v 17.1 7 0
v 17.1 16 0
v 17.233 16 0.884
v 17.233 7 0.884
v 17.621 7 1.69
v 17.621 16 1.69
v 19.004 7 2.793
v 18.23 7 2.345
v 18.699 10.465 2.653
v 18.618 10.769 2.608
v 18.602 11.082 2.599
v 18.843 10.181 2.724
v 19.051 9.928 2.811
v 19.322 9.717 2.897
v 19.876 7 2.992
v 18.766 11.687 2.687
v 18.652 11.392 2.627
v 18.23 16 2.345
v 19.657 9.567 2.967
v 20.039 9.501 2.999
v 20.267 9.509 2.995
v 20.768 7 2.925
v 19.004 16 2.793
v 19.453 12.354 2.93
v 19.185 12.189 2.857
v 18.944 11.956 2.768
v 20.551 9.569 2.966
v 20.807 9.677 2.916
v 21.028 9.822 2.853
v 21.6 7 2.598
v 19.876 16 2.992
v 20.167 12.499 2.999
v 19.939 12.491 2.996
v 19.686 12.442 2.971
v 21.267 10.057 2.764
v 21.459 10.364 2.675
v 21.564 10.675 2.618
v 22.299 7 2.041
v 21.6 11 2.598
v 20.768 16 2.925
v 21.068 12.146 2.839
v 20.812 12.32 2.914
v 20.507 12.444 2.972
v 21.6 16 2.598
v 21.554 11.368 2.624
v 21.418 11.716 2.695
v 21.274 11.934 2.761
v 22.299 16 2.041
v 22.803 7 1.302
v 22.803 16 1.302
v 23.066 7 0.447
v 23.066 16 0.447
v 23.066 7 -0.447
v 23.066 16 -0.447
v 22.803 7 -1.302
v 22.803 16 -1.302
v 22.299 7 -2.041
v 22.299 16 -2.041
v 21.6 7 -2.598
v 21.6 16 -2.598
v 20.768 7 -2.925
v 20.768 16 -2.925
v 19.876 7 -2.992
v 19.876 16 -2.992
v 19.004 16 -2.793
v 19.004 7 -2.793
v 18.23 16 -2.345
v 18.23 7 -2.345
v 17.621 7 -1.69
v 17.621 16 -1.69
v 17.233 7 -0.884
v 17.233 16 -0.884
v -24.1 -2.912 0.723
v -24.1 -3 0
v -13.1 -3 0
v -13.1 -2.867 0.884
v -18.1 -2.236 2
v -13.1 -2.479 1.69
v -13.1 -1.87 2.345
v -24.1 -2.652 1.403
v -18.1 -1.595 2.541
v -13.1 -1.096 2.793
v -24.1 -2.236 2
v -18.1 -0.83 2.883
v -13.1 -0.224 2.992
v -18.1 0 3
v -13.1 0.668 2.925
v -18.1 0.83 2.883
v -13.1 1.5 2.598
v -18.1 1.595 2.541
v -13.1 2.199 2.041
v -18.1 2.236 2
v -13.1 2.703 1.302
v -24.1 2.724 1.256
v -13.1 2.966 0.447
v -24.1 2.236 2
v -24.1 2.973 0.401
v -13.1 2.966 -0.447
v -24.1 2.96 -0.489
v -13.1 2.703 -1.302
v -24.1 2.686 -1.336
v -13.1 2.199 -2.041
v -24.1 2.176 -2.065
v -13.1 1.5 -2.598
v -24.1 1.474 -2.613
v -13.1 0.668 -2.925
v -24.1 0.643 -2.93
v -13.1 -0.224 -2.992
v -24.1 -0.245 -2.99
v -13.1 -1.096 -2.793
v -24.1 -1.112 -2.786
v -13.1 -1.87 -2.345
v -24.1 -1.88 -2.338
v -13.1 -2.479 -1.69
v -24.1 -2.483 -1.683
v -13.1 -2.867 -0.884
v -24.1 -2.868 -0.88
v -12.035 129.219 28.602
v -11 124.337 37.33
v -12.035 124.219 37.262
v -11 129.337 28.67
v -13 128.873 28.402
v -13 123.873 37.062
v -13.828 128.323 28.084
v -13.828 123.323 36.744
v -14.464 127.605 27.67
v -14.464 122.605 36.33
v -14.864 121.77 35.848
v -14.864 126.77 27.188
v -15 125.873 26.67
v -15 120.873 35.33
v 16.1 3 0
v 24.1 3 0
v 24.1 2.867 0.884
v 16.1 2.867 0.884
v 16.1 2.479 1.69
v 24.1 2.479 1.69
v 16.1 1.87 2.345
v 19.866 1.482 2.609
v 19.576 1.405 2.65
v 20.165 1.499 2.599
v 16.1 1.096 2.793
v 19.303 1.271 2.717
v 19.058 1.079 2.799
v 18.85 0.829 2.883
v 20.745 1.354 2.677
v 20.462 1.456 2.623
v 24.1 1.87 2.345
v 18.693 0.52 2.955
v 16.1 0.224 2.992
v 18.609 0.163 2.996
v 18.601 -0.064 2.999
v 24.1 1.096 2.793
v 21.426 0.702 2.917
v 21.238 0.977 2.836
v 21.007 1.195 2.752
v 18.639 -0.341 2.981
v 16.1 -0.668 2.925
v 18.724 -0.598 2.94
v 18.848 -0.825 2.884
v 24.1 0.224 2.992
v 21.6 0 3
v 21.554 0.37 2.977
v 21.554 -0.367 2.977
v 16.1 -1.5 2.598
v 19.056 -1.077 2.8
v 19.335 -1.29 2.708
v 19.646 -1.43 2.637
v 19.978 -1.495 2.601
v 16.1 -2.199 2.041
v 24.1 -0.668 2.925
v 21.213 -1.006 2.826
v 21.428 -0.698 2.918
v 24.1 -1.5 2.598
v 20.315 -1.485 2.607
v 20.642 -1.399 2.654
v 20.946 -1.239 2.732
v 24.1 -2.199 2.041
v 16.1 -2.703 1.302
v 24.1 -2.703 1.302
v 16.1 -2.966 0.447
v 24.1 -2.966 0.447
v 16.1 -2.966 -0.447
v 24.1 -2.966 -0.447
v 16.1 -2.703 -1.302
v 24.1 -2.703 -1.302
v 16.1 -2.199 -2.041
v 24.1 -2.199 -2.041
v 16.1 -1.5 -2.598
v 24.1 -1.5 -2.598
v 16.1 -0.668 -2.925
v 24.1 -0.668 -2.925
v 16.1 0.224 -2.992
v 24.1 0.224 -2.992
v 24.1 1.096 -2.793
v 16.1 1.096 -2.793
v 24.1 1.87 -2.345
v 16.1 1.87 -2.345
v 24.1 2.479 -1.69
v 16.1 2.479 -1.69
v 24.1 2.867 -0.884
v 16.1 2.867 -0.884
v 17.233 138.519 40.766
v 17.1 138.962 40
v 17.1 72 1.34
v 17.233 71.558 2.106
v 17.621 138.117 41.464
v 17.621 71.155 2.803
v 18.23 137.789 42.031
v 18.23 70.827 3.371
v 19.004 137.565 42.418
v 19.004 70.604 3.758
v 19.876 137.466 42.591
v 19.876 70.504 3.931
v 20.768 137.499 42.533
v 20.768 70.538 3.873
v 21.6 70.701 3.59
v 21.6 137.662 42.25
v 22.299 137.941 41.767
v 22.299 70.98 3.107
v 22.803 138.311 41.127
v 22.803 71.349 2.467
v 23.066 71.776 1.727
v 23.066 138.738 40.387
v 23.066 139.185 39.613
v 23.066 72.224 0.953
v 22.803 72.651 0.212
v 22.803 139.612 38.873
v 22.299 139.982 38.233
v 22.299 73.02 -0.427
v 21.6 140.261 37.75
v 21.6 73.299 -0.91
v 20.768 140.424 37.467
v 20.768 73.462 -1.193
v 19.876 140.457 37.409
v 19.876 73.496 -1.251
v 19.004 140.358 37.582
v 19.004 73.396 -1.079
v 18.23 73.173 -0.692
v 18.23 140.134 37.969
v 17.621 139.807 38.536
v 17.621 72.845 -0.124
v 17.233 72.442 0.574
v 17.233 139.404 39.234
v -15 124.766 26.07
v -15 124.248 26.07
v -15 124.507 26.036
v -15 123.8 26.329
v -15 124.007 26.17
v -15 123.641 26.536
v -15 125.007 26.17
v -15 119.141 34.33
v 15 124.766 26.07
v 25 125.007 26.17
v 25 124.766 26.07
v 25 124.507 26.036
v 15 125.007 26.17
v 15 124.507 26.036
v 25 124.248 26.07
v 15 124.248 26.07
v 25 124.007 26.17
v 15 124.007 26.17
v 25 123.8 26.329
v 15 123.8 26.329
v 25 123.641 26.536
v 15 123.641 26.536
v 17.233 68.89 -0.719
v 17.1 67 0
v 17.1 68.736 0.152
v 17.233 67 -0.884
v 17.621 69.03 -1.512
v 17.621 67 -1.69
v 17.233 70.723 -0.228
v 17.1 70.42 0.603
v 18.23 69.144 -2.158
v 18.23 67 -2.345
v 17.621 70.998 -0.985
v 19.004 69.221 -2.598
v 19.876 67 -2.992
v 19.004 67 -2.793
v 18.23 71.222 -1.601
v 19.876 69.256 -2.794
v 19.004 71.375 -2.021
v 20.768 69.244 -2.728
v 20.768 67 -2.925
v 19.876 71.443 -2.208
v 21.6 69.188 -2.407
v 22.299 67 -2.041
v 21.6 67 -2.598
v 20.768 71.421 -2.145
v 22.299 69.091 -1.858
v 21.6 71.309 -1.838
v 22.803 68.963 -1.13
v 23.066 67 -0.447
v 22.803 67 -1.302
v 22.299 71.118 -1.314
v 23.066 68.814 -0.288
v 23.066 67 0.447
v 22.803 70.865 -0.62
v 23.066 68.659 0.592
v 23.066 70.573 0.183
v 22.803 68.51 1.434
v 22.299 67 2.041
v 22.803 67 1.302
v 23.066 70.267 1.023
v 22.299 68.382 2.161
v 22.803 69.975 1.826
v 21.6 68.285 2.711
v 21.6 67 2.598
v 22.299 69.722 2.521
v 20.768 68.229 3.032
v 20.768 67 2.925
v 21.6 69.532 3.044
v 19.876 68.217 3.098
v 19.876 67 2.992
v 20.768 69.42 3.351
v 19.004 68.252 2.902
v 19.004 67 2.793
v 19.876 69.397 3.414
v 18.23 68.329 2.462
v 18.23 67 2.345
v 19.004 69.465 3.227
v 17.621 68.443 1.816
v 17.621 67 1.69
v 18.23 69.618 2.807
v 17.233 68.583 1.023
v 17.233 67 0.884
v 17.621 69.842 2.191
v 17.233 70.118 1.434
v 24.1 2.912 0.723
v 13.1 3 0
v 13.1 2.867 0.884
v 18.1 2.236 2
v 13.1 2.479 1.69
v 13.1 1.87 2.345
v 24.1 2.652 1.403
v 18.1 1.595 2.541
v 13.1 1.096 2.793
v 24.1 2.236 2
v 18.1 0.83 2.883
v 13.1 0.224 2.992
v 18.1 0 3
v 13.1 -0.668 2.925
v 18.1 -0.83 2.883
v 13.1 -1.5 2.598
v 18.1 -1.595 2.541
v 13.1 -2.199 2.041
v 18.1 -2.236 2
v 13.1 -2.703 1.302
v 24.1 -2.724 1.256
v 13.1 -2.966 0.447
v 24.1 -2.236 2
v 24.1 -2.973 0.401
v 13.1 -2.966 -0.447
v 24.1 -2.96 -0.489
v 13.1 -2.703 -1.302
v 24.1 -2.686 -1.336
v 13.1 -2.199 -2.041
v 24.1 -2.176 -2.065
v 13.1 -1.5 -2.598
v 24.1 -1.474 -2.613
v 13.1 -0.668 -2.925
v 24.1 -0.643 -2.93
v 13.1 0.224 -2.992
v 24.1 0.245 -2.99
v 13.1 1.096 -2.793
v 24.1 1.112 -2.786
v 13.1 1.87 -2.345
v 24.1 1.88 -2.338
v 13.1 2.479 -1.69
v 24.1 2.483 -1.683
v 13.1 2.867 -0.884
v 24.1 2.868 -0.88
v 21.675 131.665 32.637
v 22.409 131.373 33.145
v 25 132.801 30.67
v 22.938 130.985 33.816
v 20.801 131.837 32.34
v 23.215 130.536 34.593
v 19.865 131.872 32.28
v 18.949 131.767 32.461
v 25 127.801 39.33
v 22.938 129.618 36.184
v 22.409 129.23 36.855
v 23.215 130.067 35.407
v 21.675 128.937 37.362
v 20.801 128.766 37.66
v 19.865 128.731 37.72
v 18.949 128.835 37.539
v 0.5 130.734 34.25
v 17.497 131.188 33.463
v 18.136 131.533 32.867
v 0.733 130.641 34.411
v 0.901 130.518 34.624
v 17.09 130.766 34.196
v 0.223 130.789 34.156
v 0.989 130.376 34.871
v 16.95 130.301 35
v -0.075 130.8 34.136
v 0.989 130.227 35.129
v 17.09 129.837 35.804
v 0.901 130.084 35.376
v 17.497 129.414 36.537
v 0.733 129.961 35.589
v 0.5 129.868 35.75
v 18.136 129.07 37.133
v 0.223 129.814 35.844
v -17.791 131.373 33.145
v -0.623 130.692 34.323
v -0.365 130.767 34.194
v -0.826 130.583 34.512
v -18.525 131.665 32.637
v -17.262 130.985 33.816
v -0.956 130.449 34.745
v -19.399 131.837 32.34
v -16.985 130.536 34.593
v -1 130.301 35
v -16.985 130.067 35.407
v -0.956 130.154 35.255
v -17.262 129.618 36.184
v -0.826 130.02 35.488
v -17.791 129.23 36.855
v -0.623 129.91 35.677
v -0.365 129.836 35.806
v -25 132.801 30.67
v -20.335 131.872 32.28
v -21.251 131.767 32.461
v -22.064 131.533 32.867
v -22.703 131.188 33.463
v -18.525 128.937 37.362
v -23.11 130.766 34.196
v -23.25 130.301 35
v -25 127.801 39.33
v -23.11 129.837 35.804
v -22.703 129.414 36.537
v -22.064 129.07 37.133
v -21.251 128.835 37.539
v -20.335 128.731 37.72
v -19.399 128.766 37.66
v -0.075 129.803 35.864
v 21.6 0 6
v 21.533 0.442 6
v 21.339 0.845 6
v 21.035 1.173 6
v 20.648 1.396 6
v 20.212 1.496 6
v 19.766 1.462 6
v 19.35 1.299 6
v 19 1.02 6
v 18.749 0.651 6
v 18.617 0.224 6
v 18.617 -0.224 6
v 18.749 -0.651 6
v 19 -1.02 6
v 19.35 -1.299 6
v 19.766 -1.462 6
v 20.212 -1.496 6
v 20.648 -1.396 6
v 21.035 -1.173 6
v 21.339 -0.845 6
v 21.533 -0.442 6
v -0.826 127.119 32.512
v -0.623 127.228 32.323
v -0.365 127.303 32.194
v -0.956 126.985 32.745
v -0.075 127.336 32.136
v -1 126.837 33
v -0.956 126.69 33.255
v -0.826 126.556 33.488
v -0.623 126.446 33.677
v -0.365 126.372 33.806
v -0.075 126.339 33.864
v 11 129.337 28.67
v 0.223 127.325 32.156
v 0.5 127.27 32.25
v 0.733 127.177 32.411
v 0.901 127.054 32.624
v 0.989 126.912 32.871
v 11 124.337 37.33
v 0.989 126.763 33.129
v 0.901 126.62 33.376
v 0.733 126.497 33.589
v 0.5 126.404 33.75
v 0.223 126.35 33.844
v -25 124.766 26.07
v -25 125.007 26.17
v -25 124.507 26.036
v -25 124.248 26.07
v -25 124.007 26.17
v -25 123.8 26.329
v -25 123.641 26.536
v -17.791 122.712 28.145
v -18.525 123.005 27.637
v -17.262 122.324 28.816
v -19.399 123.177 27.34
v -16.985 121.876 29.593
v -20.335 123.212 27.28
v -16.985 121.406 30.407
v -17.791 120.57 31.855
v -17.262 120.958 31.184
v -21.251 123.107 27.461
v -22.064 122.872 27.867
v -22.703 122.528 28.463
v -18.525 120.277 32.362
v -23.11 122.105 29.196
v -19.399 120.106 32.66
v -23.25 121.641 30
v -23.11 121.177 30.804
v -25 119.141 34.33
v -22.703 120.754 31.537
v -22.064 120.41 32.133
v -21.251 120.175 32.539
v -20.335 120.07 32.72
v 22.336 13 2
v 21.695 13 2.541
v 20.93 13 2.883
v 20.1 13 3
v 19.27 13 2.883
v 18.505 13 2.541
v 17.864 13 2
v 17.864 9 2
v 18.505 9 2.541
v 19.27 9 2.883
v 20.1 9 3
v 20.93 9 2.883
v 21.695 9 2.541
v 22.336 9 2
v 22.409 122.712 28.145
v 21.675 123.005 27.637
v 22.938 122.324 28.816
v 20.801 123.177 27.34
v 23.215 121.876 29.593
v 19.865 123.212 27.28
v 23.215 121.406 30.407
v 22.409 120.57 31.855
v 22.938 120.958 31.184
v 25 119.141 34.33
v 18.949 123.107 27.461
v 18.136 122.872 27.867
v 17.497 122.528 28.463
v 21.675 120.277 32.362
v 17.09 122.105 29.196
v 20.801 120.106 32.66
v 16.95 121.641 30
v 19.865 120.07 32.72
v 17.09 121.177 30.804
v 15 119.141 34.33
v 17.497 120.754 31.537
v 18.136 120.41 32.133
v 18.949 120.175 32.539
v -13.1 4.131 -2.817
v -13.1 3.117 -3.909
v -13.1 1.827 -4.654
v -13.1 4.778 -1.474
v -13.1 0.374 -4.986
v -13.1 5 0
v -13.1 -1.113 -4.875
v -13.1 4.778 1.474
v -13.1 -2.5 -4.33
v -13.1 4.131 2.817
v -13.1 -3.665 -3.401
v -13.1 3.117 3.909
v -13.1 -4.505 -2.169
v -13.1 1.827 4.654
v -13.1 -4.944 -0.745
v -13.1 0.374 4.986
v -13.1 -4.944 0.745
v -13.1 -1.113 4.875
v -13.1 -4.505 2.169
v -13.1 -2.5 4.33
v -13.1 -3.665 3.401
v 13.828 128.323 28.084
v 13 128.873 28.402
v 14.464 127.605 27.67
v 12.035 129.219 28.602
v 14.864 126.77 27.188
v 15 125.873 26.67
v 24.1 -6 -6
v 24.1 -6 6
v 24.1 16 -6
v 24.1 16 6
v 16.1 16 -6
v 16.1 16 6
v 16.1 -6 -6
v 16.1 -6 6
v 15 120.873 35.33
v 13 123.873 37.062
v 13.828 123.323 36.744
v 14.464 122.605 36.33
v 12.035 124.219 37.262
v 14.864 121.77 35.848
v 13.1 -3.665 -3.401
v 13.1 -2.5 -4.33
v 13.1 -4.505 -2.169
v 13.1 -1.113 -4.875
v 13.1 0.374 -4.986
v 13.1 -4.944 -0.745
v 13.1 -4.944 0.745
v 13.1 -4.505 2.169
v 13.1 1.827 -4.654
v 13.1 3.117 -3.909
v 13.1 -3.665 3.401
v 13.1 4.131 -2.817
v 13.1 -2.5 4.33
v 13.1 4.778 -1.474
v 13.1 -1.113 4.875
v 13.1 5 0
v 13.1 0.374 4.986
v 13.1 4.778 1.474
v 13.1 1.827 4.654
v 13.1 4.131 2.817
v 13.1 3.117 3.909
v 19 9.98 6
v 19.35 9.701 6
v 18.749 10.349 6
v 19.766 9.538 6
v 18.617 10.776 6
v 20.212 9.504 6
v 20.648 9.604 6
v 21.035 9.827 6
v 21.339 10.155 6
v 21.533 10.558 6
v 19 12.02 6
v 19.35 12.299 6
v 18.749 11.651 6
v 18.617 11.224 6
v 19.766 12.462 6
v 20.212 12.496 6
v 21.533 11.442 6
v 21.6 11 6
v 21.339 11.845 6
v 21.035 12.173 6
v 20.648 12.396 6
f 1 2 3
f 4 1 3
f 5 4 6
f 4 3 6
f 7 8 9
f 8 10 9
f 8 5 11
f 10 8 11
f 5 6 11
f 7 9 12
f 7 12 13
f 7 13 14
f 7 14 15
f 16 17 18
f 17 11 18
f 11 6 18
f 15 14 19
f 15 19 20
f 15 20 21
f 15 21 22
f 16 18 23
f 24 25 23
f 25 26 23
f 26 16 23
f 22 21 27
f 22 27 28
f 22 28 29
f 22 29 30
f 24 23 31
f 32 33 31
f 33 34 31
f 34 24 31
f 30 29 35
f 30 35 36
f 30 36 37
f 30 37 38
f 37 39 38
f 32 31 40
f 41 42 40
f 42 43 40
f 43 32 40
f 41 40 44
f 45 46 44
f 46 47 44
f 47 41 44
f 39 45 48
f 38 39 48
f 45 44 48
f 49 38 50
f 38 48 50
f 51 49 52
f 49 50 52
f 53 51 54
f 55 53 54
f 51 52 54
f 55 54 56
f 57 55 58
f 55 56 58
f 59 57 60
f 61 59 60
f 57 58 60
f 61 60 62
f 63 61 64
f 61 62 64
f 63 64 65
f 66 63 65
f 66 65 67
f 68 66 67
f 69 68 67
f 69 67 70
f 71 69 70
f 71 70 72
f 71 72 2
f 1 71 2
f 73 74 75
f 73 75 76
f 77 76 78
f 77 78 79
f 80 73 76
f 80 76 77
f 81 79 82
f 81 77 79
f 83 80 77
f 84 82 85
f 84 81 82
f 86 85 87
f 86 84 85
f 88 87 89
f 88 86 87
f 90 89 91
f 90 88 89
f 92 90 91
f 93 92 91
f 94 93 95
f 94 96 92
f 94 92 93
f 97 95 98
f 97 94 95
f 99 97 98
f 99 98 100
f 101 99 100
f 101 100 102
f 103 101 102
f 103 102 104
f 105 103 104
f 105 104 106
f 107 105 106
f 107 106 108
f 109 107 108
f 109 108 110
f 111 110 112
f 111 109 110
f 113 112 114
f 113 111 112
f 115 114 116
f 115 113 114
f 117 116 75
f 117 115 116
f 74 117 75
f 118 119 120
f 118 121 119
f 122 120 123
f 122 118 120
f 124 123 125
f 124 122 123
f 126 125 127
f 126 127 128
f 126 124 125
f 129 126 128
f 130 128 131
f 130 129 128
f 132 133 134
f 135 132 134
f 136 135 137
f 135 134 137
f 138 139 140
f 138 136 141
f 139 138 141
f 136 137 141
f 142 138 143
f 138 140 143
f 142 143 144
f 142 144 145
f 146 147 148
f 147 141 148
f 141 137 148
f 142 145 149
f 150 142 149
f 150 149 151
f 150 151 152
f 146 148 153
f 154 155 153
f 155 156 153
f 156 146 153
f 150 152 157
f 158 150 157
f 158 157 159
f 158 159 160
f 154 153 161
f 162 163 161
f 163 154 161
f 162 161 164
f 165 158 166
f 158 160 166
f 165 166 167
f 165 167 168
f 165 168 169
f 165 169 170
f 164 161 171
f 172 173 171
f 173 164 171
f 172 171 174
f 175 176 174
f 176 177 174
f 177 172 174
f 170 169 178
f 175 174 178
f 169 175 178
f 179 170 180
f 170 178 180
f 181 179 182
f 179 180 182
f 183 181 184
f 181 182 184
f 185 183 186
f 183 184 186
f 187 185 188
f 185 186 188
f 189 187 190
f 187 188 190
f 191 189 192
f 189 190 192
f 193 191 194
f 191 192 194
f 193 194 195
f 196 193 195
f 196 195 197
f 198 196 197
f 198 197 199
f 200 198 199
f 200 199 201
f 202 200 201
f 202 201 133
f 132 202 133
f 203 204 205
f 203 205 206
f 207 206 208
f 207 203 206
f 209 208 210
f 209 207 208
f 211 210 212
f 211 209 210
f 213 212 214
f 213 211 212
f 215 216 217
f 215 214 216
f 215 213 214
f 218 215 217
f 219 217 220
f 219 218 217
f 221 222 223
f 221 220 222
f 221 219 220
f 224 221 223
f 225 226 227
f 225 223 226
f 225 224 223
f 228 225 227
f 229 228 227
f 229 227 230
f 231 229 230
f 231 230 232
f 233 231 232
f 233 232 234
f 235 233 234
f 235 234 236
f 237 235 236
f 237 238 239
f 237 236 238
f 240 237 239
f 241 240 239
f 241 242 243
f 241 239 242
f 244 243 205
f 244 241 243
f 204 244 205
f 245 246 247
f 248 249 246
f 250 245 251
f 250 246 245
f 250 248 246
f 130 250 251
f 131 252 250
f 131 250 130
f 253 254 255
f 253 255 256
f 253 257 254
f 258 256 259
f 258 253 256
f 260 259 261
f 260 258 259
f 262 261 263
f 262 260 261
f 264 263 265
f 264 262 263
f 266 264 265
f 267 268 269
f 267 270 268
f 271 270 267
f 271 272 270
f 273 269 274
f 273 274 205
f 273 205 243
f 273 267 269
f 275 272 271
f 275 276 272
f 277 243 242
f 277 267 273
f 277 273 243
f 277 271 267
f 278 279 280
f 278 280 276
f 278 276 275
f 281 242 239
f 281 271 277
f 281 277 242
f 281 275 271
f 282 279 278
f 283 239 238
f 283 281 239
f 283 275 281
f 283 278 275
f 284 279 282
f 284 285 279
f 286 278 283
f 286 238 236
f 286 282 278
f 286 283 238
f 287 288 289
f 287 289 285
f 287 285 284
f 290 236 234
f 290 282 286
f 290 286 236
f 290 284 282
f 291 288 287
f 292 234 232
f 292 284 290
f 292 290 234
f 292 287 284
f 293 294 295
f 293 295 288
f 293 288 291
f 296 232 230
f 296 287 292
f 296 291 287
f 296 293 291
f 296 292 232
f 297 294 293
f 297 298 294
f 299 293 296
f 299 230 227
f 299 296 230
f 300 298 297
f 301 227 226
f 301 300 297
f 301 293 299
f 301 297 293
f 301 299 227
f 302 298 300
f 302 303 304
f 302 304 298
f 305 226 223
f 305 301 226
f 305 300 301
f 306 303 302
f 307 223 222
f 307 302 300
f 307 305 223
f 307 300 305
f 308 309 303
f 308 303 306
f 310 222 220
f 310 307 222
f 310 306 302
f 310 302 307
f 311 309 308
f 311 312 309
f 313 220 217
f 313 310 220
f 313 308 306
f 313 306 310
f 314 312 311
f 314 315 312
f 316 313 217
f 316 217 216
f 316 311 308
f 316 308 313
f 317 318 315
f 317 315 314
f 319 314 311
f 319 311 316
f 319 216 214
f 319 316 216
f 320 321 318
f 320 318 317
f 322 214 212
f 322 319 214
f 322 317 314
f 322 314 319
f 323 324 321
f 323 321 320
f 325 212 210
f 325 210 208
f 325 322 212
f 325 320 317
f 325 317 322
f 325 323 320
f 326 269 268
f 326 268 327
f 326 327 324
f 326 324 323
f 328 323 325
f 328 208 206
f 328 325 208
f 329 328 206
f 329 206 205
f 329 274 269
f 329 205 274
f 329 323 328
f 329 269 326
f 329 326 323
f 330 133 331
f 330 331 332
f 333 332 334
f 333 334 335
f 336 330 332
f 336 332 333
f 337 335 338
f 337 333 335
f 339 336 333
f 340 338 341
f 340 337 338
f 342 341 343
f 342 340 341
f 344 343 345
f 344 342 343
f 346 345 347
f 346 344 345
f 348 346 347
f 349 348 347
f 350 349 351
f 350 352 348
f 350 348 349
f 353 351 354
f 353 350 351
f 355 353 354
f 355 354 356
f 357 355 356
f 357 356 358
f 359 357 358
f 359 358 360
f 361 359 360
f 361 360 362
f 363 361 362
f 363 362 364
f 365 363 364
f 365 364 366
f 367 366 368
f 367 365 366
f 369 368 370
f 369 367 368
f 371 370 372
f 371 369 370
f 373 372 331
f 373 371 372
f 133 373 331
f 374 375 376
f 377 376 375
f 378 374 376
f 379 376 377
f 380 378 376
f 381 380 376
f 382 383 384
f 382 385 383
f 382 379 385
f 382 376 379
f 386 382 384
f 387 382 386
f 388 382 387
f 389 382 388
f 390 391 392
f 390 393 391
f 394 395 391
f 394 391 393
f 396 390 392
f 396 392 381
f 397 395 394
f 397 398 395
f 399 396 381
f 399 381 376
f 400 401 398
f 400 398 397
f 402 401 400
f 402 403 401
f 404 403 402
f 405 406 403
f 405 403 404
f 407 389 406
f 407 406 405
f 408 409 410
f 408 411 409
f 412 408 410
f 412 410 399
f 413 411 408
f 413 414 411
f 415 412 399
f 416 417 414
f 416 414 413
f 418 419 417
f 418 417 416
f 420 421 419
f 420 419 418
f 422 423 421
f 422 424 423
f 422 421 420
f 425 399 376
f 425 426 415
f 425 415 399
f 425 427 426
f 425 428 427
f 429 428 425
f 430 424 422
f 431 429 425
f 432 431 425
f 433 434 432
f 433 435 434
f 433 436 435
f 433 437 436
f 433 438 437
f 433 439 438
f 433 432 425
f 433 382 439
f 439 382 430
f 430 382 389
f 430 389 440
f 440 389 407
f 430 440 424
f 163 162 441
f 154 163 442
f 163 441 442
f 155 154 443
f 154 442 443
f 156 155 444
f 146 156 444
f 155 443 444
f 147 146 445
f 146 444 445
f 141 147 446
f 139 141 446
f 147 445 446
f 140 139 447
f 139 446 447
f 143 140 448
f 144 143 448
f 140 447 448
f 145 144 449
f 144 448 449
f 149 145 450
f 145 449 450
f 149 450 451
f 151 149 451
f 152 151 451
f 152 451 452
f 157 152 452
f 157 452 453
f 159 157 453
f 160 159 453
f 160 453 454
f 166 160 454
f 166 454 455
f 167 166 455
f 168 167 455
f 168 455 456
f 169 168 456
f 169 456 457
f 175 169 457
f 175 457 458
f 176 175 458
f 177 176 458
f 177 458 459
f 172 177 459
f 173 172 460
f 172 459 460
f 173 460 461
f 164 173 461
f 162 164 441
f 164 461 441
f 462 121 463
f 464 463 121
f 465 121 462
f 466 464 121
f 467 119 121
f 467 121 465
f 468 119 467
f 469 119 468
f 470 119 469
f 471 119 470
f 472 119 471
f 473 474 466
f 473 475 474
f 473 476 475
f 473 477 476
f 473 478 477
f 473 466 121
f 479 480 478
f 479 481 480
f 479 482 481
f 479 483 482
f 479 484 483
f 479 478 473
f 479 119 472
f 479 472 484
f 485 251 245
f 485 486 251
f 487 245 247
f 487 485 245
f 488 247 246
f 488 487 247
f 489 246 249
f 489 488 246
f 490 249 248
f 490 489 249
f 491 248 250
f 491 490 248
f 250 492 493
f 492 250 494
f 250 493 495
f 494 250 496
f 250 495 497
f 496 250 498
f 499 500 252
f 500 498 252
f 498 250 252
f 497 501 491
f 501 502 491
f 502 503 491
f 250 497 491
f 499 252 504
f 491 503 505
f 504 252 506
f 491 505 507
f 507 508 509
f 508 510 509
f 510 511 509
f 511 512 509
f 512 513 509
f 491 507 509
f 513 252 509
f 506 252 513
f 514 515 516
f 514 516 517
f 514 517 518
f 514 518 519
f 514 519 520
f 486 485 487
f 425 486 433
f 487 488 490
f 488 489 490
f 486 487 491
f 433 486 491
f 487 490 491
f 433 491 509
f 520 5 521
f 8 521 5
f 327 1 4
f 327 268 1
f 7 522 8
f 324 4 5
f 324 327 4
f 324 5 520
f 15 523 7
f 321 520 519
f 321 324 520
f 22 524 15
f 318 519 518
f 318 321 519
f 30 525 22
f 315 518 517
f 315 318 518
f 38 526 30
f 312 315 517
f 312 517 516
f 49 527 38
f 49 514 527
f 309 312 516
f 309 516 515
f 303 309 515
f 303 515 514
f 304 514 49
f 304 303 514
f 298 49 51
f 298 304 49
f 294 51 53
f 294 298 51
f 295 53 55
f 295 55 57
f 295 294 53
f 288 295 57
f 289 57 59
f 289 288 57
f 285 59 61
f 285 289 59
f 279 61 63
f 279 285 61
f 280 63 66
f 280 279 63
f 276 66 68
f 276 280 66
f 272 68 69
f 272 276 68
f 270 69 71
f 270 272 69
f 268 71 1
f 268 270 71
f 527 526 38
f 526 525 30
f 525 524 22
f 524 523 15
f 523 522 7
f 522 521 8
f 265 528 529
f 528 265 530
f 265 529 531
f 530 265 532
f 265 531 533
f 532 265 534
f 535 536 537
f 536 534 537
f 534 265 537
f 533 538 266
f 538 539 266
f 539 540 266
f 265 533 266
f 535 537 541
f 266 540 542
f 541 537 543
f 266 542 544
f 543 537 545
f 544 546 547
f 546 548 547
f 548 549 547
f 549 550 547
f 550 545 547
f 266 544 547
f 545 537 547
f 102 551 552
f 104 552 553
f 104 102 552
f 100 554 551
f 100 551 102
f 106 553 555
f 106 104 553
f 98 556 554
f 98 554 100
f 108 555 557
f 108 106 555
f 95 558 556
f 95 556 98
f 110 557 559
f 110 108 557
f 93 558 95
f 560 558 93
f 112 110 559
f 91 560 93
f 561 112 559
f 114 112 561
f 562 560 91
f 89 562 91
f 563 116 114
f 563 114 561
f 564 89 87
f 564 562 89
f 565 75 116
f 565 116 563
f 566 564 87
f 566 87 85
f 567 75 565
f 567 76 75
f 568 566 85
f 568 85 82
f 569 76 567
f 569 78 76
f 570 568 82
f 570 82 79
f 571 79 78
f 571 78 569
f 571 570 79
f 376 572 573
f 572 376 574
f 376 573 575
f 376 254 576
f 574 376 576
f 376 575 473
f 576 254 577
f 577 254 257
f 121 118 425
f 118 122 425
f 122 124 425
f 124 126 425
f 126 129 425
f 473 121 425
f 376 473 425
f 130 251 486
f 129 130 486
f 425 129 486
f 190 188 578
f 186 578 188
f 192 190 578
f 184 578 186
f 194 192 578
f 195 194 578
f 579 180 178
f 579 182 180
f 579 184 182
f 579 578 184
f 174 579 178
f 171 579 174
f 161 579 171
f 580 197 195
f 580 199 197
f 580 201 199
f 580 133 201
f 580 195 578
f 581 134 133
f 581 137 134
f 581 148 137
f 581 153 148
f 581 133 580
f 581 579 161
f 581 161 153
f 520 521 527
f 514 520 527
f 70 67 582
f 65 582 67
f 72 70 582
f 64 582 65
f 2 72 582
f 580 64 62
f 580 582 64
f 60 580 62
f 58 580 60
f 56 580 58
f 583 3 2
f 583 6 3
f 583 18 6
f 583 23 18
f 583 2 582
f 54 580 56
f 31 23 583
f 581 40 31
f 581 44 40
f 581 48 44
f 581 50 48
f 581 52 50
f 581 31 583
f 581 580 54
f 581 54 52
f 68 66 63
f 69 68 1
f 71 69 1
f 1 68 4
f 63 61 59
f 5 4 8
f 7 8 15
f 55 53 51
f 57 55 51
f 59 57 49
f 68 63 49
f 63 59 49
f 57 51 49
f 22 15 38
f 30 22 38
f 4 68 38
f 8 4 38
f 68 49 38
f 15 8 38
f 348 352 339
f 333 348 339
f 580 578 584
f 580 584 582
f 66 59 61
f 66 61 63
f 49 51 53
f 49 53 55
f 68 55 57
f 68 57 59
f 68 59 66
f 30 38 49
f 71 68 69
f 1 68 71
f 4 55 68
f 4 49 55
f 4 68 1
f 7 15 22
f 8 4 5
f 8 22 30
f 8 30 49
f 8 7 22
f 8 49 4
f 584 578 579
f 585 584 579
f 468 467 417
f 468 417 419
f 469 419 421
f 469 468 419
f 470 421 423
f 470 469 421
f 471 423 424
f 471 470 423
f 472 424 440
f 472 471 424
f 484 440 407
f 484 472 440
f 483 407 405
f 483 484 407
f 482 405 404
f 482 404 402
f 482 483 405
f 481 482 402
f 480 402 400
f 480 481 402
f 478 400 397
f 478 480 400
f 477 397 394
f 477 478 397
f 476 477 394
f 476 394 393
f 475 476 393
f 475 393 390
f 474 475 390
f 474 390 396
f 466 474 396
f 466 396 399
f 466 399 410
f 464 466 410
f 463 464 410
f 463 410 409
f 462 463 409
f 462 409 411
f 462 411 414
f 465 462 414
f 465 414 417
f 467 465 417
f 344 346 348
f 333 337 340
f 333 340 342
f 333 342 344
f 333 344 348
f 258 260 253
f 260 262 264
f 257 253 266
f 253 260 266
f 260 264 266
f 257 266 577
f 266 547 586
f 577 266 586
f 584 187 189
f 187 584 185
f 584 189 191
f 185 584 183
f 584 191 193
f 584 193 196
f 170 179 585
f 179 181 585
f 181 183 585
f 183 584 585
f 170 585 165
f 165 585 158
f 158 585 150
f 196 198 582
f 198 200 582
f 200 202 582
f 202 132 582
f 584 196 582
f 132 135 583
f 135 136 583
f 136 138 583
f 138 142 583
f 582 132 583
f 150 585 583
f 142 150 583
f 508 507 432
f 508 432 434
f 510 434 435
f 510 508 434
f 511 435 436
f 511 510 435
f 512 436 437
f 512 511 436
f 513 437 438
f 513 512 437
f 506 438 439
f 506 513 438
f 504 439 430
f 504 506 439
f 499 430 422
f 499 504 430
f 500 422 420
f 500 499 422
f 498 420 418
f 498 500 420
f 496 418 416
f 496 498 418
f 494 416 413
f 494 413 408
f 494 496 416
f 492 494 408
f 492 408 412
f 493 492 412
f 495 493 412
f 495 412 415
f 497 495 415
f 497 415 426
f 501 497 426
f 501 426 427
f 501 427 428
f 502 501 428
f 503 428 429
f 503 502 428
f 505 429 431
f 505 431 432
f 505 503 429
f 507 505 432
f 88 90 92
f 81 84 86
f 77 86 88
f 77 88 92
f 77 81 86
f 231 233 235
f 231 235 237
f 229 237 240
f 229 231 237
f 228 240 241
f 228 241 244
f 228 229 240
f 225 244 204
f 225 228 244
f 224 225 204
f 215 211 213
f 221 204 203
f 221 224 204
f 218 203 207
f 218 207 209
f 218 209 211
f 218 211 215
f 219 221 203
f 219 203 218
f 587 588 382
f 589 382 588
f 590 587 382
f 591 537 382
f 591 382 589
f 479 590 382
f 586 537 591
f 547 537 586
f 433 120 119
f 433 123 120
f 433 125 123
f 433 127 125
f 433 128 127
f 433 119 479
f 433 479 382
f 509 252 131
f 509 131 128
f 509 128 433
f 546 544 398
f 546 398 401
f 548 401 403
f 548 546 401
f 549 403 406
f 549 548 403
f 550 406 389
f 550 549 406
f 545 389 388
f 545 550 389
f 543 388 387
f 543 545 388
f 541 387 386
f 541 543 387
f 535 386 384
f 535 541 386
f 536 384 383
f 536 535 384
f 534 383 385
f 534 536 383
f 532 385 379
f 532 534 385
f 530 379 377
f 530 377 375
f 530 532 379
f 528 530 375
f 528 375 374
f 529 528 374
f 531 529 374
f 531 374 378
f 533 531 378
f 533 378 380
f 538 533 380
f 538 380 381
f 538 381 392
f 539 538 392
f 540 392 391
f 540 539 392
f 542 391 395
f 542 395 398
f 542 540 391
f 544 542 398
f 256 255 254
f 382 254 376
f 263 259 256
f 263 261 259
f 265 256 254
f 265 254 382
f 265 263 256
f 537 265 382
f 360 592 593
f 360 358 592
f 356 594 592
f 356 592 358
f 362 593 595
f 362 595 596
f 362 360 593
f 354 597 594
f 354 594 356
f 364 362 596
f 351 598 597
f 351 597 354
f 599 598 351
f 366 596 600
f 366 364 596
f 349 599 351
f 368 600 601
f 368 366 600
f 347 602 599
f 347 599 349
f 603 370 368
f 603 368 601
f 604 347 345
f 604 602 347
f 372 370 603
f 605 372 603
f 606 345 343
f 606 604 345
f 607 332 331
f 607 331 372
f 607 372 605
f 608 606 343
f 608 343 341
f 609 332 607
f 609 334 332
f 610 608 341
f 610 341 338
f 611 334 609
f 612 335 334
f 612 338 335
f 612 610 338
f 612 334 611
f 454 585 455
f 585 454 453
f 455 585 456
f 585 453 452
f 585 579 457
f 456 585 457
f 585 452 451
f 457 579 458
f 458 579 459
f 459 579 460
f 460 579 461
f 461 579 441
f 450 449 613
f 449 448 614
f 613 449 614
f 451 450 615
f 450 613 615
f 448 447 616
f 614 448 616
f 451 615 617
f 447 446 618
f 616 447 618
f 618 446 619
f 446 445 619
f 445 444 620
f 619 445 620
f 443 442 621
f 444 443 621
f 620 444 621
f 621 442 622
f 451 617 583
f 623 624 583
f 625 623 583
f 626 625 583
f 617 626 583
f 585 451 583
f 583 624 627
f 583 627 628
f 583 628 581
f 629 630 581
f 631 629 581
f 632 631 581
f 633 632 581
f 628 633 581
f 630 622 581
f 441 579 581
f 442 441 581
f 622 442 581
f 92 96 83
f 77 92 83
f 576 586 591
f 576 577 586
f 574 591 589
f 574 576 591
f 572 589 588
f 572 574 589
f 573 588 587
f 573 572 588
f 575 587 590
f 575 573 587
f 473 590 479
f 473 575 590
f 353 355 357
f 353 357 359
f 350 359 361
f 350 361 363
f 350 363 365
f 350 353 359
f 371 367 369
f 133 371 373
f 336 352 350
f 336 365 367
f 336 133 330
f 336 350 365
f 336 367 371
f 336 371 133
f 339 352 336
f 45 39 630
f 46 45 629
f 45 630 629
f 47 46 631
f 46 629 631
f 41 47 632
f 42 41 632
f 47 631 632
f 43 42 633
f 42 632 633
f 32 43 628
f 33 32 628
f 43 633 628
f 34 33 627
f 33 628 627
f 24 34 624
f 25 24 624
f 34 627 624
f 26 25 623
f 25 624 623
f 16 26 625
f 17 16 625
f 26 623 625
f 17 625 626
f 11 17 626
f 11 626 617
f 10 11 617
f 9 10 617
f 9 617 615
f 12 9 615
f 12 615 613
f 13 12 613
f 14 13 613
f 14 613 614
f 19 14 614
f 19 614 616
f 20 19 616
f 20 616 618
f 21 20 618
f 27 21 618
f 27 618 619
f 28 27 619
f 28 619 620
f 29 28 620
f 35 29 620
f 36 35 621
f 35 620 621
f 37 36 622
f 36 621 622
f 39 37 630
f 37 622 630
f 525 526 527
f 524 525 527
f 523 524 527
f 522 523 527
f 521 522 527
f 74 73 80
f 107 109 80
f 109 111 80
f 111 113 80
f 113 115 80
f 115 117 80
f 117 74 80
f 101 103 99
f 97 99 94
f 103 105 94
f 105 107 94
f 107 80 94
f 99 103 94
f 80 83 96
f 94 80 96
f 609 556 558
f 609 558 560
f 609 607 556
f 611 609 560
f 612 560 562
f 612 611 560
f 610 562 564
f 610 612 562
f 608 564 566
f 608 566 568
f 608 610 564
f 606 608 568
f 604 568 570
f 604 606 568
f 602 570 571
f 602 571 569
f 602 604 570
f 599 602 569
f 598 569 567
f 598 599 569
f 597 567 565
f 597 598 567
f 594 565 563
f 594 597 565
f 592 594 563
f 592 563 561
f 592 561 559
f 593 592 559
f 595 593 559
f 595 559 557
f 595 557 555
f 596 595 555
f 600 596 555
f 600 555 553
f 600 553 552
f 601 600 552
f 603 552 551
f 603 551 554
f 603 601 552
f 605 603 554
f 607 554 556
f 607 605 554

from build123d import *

# Parameters (mm, degrees)
F0_R      = 5
F1_DEPTH  = 24.1
F2_R      = 5
F2_R_2    = 3
F3_DEPTH  = 11
F4_R      = 5
F4_R_2    = 3
F5_DEPTH  = 11
F7_DEPTH  = 6
F9_DEPTH  = 6
F10_W     = 22
F10_H     = 12
F11_DEPTH = 8
F12_R     = 3
F13_DEPTH = 48.201
F14_R     = 3
F15_DEPTH = 9
F16_R     = 1.5
F17_REACH = 16.2436406871
F18_R     = 1.5
F19_REACH = 16.2436406871
F20_R     = 3
F25_DEPTH = 4
F27_W     = 50
F27_H     = 10
F27_R     = 3.15
F27_R_2   = 1
F28_DEPTH = 10
F29_W     = 30
F29_H     = 6
F30_DEPTH = 45.5881685741
F31_R     = 4
F32_R     = 1


with BuildPart() as f1:
    # F0 (on Right) → F1 (new body, symmetric)
    with BuildSketch(Plane.YZ):
        Circle(F0_R)
    extrude(amount=F1_DEPTH, both=True)

    # F2 (on face) → F3 (cut)
    with BuildSketch(Plane.YZ.offset(24.1)):
        Circle(F2_R)
        Circle(F2_R_2, mode=Mode.SUBTRACT)
    extrude(amount=-F3_DEPTH, mode=Mode.SUBTRACT)

    # F4 (on face) → F5 (cut)
    with BuildSketch(Plane(origin=(-24.1, 0, 0), x_dir=(0, -1, 0), z_dir=(-1, 0, 0))):
        Circle(F4_R)
        Circle(F4_R_2, mode=Mode.SUBTRACT)
    extrude(amount=-F5_DEPTH, mode=Mode.SUBTRACT)

    # F6 (on face) → F7 (cut)
    with BuildSketch(Plane.YZ.offset(24.1)):
        with BuildLine():
            ThreePointArc((2.2360679775, 2), (0, 3), (-2.2360679775, 2))
            Line((-2.2360679775, 2), (2.2360679775, 2))
        make_face()
    extrude(amount=-F7_DEPTH, mode=Mode.SUBTRACT)

    # F8 (on face) → F9 (cut)
    with BuildSketch(Plane(origin=(-24.1, 0, 0), x_dir=(0, -1, 0), z_dir=(-1, 0, 0))):
        with BuildLine():
            Line((-2.2360679775, 2), (2.2360679775, 2))
            ThreePointArc((2.2360679775, 2), (0, 3), (-2.2360679775, 2))
        make_face()
    extrude(amount=-F9_DEPTH, mode=Mode.SUBTRACT)


with BuildPart() as f11:
    # F10 (on face) → F11 (new body)
    with BuildSketch(Plane.YZ.offset(24.1)):
        with Locations((5, 0)):
            Rectangle(F10_W, F10_H)
    extrude(amount=-F11_DEPTH)

    # F12 (on face) → F13 (cut, through all)
    with BuildSketch(Plane.YZ.offset(24.1)):
        Circle(F12_R)
    extrude(amount=-F13_DEPTH, mode=Mode.SUBTRACT)

    # F14 (on face) → F15 (cut)
    with BuildSketch(Plane(origin=(0, 16, 0), x_dir=(-1, 0, 0), z_dir=(0, 1, 0))):
        with Locations((-20.1, 0)):
            Circle(F14_R)
    extrude(amount=-F15_DEPTH, mode=Mode.SUBTRACT)

    f17_end = f11.faces().sort_by_distance((20.1, -3, 0))[0]
    # F16 (on face) → F17 (cut, up to a face of the model that its end follows)
    with BuildSketch(Plane.XY.offset(6)):
        with Locations((20.1, 0)):
            Circle(F16_R)
    f17_long = extrude(amount=-F17_REACH, mode=Mode.PRIVATE)
    add(split(f17_long, bisect_by=f17_end, keep=Keep.ALL, mode=Mode.PRIVATE).solids().sort_by_distance((20.1, 0, 6))[0], mode=Mode.SUBTRACT)

    f19_end = f11.faces().sort_by_distance((23.1, 11.5, 0))[0]
    # F18 (on face) → F19 (cut, up to a face of the model that its end follows)
    with BuildSketch(Plane.XY.offset(6)):
        with Locations((20.1, 11)):
            Circle(F18_R)
    f19_long = extrude(amount=-F19_REACH, mode=Mode.PRIVATE)
    add(split(f19_long, bisect_by=f19_end, keep=Keep.ALL, mode=Mode.PRIVATE).solids().sort_by_distance((20.1, 11, 6))[0], mode=Mode.SUBTRACT)


with BuildPart() as f22:
    # F22: sweep along a path in F21
    with BuildLine(Plane.YZ) as f22_path:
        Line((7, 0), (67, 0))
        ThreePointArc((67, 0), (69.588190451, 0.3407417371), (72, 1.3397459622))
        Line((72, 1.3397459622), (138.9615242271, 40))
    # F20 (on face) → F22 (sweep)
    with BuildSketch(Plane(origin=(0, 7, 0), x_dir=(-1, 0, 0), z_dir=(0, 1, 0))):
        with Locations((-20.1, 0)):
            Circle(F20_R)
    sweep(path=f22_path.line)

    # F24 (on offset) → F25 (cut)
    with BuildSketch(Plane.XZ.offset(-9)):
        with BuildLine():
            Line((17.8639320225, 2), (22.3360679775, 2))
            ThreePointArc((22.3360679775, 2), (20.1, 3), (17.8639320225, 2))
        make_face()
    extrude(amount=-F25_DEPTH, mode=Mode.SUBTRACT)


with BuildPart() as f28:
    # F27 (on offset) → F28 (new body)
    with BuildSketch(Plane(origin=(0, 104.2211431703, 60.1721050646), x_dir=(-1, 0, 0), z_dir=(0, 0.8660254038, 0.5))):
        with Locations((0, -34.8397459622)):
            Rectangle(F27_W, F27_H)
        with Locations((-20.1, -34.8397459622)):
            Circle(F27_R, mode=Mode.SUBTRACT)
        with Locations((0, -34.8397459622)):
            Circle(F27_R_2, mode=Mode.SUBTRACT)
        with Locations((20.1, -34.8397459622)):
            Circle(F27_R, mode=Mode.SUBTRACT)
    extrude(amount=F28_DEPTH)

    # F29 (on face) → F30 (cut, through all)
    with BuildSketch(Plane(origin=(0, 14.9198729811, -25.8419780457), x_dir=(1, 0, 0), z_dir=(0, -0.5, 0.8660254038))):
        with Locations((0, 123.3442101292)):
            Rectangle(F29_W, F29_H)
    extrude(amount=-F30_DEPTH, mode=Mode.SUBTRACT)

    # F31
    f31_edges = [f28.edges().sort_by_distance(p)[0] for p in [
        (-15, 126.837169, 33),
        (15, 126.837169, 33),
    ]]
    fillet(f31_edges, radius=F31_R)

    # F32
    f32_edges = [f28.edges().sort_by_distance(p)[0] for p in [
        (20, 124.141016, 25.669873),
        (-20, 124.141016, 25.669873),
    ]]
    fillet(f32_edges, radius=F32_R)


solid = Compound([f1.part, f11.part, f22.part, f28.part])
